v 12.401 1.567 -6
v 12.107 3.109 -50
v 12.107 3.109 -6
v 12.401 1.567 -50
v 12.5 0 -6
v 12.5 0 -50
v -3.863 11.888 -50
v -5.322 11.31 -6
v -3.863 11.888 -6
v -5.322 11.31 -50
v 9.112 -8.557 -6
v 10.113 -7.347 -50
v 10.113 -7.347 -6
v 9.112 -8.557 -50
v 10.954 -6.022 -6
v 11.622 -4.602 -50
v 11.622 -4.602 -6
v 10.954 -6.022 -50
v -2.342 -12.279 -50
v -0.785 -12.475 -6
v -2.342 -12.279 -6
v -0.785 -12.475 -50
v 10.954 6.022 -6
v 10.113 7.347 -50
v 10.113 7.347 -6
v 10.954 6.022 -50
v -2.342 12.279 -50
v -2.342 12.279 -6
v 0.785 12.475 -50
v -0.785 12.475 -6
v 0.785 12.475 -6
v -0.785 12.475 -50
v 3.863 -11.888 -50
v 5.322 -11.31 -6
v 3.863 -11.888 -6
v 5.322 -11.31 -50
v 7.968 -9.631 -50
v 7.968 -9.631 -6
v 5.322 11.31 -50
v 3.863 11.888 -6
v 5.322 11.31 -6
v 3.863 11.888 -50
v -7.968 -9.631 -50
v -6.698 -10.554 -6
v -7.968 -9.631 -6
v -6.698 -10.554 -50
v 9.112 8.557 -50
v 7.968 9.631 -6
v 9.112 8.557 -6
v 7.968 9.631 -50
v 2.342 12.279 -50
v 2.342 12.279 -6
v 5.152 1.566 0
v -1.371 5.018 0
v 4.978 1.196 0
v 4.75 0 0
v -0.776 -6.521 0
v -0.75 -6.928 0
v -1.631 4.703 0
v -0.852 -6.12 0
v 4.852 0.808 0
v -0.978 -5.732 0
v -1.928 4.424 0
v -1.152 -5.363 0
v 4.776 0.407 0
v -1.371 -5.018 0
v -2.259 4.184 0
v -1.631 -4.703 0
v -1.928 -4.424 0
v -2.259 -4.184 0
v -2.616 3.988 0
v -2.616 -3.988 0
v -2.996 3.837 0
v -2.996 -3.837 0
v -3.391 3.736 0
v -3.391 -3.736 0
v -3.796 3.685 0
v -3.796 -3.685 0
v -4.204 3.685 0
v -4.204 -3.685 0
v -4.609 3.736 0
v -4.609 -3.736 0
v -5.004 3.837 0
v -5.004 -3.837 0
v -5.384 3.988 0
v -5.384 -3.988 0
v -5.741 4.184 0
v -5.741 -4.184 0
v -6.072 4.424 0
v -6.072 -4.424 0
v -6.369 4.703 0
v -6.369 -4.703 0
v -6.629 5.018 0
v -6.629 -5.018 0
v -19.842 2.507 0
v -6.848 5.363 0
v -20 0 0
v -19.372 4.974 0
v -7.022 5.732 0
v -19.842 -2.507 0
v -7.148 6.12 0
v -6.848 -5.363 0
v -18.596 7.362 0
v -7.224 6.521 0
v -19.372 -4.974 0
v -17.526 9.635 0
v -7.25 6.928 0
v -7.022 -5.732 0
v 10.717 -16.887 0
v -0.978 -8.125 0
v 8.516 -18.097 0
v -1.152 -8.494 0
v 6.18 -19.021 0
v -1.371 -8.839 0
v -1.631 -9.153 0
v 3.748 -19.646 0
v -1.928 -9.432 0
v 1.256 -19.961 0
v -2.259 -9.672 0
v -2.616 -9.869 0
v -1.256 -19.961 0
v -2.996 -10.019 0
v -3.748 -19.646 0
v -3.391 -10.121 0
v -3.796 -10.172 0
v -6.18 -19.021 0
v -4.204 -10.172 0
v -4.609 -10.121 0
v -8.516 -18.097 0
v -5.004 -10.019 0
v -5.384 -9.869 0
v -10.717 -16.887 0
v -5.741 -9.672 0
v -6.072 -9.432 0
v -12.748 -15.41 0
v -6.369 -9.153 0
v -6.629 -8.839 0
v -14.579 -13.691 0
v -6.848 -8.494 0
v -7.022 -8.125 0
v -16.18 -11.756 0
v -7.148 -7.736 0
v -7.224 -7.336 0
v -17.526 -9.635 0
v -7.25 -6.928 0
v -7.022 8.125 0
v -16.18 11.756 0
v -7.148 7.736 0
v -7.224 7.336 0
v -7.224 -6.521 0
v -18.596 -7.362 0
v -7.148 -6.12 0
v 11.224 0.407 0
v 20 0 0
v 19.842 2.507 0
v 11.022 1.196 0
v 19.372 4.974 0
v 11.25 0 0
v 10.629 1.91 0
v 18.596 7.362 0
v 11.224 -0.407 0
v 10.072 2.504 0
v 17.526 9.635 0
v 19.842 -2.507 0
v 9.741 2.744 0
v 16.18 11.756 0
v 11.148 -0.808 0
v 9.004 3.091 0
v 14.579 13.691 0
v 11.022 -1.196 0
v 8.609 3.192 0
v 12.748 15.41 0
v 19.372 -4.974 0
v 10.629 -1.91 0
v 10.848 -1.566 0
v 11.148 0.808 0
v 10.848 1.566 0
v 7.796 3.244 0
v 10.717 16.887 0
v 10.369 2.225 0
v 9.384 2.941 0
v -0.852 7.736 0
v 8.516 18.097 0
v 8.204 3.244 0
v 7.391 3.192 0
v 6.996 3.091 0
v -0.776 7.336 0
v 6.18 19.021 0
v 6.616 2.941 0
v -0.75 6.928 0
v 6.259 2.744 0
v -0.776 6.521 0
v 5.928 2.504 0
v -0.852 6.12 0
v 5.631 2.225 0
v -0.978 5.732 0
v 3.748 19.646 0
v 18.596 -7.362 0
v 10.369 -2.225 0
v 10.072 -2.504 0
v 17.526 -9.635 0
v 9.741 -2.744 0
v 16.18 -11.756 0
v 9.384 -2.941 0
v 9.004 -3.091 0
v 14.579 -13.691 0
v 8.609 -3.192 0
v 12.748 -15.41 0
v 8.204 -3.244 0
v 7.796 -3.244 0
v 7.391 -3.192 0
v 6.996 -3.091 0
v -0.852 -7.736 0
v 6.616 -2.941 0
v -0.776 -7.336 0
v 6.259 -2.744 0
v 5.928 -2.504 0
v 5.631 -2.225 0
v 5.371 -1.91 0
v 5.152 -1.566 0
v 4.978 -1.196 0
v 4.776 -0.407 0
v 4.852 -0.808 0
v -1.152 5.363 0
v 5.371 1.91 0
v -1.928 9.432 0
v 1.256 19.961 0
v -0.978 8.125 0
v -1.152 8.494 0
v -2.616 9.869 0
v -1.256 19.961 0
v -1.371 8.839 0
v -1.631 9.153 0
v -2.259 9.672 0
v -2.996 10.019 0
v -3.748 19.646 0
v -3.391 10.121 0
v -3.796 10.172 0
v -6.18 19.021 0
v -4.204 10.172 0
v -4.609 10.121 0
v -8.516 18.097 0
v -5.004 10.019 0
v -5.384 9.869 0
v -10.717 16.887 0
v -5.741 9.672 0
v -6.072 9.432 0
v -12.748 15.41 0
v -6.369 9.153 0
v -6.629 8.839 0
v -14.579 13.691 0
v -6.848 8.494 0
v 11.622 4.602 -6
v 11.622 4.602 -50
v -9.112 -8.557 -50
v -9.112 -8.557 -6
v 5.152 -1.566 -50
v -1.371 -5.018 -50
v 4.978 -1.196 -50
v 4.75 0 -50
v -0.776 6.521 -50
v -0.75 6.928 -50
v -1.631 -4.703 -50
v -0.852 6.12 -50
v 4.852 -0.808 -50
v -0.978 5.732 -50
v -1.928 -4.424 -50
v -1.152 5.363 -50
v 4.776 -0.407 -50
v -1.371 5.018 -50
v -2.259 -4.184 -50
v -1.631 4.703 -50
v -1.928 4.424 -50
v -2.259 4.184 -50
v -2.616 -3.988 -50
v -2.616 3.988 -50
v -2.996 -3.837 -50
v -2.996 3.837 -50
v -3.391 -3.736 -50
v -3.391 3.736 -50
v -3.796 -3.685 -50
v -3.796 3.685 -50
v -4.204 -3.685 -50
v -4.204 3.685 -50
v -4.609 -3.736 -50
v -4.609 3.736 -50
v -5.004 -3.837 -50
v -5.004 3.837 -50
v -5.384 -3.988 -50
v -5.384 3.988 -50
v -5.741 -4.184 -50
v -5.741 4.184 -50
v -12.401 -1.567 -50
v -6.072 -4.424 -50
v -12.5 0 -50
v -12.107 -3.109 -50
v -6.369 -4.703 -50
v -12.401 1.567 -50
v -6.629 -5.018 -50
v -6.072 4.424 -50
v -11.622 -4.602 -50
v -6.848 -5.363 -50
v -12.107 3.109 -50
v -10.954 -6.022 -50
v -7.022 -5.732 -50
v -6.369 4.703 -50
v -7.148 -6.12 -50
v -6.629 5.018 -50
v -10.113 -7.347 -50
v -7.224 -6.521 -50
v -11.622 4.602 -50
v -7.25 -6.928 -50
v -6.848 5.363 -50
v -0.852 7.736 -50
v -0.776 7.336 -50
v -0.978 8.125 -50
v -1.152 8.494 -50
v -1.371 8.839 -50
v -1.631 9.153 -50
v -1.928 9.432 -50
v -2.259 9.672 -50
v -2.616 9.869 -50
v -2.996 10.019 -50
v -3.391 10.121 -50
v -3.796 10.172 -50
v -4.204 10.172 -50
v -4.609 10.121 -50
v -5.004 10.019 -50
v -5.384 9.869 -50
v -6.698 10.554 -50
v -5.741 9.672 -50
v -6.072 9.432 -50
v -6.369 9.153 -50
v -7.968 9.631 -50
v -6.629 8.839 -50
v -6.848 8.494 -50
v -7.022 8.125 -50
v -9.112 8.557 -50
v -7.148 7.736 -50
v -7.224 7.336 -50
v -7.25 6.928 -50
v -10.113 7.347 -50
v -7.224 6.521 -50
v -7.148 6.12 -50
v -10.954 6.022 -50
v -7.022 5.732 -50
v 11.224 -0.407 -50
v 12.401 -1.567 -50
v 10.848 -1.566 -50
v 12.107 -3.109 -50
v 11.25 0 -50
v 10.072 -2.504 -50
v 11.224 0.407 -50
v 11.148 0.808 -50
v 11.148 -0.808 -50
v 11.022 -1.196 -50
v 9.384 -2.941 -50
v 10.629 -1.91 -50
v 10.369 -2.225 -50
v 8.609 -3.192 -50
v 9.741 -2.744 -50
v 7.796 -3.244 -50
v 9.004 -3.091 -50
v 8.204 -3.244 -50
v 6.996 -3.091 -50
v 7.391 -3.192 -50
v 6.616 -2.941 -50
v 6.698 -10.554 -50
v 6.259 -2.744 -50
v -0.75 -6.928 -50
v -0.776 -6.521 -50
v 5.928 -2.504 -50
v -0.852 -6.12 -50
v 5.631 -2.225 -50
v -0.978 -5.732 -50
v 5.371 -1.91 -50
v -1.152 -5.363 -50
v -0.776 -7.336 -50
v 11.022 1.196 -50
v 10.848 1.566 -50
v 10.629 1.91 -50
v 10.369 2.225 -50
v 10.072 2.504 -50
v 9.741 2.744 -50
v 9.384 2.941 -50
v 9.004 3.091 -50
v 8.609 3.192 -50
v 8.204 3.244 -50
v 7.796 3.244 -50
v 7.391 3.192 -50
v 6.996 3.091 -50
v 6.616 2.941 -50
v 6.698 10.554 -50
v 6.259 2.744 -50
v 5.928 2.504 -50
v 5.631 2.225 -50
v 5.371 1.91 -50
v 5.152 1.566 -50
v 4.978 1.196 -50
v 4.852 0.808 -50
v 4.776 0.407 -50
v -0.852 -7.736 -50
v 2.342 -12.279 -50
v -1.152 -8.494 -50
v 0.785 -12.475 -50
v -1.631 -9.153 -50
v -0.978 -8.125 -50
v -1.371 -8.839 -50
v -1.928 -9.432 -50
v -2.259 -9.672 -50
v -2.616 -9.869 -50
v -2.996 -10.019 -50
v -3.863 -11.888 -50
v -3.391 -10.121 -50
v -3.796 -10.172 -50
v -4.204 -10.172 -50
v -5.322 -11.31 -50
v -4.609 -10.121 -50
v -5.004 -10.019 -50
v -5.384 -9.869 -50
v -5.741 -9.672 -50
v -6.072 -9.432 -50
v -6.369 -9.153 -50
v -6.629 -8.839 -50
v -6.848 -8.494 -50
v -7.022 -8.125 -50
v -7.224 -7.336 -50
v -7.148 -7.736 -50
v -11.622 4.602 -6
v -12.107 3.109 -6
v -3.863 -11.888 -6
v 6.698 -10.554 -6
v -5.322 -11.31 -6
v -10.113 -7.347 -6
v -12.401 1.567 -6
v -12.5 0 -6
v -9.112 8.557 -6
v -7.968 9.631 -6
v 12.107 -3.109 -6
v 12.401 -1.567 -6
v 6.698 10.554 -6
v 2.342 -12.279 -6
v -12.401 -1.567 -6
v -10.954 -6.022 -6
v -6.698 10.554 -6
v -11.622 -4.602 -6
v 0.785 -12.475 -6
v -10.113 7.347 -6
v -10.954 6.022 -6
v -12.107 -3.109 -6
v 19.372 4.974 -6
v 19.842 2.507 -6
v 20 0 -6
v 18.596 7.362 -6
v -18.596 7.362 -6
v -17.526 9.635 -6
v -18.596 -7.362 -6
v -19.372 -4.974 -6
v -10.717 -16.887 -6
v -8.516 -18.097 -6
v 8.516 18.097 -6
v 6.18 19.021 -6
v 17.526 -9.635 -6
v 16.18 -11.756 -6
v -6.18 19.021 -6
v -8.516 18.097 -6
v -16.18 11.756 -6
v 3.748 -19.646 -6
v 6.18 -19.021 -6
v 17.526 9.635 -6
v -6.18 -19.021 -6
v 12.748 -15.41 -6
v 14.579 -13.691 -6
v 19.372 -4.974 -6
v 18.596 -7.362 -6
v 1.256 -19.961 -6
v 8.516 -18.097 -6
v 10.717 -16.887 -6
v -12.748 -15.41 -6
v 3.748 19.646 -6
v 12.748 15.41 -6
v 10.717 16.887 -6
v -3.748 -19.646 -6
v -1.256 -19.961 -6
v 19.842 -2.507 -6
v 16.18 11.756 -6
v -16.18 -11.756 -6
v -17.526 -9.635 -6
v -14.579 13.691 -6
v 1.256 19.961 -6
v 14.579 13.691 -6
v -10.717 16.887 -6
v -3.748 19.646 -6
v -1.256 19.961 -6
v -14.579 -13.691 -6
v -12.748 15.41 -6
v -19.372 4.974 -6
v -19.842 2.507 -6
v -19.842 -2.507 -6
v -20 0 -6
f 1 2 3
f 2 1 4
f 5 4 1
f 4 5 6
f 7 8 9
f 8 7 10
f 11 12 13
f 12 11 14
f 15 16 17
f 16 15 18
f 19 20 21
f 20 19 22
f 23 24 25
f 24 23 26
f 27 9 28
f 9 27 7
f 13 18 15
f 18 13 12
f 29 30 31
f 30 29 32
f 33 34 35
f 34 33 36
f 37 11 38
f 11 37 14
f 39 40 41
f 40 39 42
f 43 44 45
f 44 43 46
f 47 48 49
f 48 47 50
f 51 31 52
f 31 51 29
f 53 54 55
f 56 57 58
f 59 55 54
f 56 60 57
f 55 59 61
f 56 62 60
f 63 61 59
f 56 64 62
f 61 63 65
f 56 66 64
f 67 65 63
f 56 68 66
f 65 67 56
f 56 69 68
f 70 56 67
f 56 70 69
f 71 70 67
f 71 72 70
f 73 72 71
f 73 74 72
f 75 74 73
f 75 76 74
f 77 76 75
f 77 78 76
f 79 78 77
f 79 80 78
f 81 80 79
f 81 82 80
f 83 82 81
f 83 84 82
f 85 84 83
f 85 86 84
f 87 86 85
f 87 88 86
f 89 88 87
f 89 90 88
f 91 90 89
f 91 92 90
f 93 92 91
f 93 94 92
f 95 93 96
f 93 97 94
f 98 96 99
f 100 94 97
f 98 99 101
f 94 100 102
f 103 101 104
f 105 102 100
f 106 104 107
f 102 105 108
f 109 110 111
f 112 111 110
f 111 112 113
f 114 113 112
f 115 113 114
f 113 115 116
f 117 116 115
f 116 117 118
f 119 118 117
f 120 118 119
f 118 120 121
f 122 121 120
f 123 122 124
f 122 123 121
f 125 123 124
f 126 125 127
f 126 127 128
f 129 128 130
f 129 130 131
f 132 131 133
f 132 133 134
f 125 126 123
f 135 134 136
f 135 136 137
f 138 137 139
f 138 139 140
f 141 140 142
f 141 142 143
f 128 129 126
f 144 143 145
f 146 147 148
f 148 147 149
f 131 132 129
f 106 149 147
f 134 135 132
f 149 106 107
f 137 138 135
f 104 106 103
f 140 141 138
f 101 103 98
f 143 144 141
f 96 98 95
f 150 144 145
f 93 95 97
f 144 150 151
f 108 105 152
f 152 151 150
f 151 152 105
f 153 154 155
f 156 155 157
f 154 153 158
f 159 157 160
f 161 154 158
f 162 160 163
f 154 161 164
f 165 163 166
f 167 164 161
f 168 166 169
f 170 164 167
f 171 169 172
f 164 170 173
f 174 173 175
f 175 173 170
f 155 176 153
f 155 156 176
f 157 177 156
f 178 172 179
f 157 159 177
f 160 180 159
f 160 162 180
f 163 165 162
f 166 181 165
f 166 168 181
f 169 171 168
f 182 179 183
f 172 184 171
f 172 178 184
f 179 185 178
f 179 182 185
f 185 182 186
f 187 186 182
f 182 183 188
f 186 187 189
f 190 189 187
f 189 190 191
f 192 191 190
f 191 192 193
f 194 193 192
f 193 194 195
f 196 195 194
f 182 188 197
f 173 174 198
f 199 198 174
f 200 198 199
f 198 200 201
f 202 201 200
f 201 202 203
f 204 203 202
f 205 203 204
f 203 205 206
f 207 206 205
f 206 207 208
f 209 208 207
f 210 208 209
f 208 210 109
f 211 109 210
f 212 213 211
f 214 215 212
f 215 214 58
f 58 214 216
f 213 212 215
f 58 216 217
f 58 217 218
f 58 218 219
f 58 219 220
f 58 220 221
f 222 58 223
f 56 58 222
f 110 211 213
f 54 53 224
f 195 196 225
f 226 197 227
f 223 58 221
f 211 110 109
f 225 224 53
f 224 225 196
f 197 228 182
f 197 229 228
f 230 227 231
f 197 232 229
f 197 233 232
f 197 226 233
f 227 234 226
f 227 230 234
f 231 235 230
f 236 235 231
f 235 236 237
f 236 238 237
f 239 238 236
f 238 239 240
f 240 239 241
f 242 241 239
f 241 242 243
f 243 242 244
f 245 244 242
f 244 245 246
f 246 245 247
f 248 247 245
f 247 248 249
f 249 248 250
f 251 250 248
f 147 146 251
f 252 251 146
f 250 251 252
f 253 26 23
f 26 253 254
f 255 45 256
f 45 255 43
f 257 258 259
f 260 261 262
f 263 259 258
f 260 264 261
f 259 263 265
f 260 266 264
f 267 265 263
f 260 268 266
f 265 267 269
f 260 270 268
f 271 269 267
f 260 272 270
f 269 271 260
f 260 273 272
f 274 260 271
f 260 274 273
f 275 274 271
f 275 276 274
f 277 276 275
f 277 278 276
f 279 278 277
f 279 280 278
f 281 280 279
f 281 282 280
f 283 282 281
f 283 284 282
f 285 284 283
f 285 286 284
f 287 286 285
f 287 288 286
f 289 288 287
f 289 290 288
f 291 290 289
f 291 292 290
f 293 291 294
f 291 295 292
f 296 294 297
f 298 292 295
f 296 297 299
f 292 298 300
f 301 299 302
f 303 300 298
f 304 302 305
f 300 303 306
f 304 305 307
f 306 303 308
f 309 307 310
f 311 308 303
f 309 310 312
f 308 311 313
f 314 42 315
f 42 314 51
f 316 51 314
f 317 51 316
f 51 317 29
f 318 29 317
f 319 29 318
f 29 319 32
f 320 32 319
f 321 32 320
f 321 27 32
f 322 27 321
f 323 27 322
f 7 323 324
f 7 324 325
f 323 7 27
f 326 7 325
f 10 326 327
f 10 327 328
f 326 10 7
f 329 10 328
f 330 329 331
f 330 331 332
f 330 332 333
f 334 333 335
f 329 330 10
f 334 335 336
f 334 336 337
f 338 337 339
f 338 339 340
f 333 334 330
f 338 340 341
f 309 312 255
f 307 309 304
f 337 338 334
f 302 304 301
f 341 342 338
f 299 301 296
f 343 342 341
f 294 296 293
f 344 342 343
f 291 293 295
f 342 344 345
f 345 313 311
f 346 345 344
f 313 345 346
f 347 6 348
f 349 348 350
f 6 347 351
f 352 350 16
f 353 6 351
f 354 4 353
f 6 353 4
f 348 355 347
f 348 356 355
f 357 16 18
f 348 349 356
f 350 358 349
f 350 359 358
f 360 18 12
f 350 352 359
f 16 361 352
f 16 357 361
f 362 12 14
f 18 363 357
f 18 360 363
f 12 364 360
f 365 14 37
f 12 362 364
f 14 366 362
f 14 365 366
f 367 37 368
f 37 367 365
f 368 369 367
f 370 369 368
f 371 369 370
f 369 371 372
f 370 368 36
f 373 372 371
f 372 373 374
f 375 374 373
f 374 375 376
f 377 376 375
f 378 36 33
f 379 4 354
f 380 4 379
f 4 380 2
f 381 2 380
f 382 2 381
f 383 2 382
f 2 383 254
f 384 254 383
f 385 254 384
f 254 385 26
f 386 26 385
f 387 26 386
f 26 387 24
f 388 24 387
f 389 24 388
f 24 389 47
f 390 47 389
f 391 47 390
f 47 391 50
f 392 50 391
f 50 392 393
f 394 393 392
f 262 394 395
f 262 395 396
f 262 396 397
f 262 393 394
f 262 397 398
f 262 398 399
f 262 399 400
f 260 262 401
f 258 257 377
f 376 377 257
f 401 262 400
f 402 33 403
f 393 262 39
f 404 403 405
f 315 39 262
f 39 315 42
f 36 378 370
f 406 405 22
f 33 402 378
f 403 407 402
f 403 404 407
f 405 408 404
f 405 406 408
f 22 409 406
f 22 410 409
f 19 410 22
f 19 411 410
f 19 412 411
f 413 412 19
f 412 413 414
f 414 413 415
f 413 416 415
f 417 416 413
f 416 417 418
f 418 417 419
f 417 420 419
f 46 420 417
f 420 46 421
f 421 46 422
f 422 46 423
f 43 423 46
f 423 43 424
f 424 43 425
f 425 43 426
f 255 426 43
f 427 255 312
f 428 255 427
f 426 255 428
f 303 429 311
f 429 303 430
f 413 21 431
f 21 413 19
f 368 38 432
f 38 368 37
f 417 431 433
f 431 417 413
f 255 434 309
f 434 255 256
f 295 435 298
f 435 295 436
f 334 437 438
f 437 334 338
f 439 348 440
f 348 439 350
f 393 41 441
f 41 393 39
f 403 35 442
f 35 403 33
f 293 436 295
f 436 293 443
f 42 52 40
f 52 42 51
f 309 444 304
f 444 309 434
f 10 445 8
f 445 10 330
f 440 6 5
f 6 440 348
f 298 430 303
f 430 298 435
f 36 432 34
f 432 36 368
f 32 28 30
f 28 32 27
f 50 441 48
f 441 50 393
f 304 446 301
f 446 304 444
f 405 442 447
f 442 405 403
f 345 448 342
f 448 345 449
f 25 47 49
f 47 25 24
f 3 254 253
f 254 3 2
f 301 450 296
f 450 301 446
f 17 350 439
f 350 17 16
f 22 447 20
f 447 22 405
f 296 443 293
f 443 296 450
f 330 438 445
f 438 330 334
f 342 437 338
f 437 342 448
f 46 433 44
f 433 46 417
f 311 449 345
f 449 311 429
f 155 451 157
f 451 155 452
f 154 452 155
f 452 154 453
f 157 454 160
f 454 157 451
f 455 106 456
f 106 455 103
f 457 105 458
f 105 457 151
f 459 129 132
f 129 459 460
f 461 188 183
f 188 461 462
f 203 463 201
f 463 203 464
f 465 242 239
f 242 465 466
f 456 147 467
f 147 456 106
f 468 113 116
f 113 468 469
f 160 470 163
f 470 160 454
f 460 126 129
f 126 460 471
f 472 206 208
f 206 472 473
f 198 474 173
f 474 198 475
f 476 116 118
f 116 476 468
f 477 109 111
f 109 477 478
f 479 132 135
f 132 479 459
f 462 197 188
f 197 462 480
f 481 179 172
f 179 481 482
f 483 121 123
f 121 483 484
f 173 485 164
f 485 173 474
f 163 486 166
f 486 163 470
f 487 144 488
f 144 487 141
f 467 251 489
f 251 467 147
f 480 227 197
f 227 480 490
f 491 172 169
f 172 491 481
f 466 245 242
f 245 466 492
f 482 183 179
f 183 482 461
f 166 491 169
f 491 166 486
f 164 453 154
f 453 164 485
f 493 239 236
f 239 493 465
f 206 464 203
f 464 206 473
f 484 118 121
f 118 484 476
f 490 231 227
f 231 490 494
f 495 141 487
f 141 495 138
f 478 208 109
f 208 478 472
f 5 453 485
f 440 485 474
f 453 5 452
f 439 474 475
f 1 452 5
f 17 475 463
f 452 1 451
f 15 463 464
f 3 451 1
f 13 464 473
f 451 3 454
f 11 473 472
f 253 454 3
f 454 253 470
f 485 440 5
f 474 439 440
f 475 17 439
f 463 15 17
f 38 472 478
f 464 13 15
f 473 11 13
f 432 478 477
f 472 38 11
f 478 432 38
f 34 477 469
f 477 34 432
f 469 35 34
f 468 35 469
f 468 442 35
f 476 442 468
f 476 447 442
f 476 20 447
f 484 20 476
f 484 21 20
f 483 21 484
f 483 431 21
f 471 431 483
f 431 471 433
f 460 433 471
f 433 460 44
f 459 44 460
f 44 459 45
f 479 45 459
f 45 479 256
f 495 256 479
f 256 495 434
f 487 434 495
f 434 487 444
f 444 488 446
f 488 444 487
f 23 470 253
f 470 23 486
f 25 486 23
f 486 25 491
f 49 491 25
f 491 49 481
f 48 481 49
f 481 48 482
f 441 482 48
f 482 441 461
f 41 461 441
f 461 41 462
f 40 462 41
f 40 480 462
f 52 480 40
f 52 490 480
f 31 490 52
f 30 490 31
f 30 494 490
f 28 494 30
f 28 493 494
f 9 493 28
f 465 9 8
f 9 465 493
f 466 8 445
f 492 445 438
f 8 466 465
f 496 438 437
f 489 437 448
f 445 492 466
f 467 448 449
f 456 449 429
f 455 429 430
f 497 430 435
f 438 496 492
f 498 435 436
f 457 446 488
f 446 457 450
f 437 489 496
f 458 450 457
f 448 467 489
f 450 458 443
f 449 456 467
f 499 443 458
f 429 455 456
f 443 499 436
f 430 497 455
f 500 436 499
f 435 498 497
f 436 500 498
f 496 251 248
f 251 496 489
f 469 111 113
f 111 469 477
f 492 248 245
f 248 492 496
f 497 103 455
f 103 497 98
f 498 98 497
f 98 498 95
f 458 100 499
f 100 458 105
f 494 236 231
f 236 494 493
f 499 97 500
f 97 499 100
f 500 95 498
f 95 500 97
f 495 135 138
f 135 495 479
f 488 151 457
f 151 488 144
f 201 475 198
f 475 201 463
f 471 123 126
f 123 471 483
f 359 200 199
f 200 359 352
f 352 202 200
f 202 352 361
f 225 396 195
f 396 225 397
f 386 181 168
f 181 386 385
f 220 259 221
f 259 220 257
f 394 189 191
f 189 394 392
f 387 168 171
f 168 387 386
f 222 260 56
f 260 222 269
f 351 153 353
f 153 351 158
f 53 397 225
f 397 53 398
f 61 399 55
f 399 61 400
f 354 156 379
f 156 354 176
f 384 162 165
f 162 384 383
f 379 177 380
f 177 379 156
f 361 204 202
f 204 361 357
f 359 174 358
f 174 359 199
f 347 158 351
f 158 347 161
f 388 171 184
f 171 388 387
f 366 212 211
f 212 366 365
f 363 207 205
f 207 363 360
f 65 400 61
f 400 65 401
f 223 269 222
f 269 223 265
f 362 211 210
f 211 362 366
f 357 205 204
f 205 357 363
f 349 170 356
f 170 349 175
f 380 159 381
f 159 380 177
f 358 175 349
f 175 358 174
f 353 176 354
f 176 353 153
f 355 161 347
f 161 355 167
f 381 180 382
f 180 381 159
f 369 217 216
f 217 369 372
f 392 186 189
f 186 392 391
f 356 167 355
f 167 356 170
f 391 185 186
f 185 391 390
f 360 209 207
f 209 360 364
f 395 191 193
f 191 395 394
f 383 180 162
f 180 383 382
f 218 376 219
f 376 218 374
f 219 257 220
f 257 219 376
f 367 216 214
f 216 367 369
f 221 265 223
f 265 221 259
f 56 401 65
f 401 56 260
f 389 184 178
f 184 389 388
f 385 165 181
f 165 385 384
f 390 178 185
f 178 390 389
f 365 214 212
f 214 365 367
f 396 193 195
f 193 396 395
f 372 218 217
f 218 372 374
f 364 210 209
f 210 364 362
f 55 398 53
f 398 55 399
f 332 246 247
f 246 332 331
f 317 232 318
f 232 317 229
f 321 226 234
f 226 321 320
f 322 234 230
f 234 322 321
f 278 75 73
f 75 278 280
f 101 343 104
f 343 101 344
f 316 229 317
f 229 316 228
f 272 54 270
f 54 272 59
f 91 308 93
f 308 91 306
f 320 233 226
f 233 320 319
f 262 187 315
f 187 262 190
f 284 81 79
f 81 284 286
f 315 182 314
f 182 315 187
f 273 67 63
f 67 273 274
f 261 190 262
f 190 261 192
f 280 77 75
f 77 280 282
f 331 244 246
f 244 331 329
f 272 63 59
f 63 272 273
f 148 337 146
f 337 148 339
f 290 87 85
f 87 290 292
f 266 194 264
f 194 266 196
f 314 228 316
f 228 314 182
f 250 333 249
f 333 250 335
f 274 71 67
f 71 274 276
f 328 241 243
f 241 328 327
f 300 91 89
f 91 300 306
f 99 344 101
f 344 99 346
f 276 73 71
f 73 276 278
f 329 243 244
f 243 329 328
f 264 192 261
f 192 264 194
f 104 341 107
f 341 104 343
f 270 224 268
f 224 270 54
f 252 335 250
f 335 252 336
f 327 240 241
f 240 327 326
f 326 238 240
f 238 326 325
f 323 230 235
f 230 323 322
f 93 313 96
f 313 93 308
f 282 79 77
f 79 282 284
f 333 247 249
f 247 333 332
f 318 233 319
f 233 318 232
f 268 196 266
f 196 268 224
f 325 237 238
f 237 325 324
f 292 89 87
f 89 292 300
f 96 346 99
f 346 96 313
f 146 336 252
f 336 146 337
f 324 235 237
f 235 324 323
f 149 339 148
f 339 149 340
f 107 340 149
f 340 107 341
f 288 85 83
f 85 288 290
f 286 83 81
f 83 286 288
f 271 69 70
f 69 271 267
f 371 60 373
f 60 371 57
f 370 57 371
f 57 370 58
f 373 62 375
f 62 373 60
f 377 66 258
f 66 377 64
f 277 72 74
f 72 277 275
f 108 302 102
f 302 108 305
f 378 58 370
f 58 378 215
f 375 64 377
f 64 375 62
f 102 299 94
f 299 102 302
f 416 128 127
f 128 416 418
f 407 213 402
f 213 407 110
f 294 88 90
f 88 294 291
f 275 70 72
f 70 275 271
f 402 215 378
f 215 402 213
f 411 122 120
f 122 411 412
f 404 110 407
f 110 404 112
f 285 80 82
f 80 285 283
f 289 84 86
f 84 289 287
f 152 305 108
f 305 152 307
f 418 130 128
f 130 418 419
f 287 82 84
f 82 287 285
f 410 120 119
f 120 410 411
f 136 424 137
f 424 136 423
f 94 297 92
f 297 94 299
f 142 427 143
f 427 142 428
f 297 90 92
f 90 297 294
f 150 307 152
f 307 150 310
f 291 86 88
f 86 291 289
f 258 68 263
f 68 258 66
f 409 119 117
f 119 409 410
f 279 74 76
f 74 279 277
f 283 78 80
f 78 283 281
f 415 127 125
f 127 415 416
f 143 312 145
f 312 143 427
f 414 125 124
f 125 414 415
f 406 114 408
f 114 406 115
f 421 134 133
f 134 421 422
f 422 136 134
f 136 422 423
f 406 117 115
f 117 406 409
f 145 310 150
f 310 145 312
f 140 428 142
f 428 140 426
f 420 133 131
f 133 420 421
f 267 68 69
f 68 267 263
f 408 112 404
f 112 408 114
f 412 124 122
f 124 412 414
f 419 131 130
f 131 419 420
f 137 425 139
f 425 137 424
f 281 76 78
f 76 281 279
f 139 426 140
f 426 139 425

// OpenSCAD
$fn = 50;


difference() {
	union() {
		translate(v = [0, 0, -50.0000000000]) {
			cylinder(h = 50, r = 12.5000000000);
		}
		translate(v = [0, 0, -6.0000000000]) {
			cylinder(h = 6, r = 20.0000000000);
		}
	}
	union() {
		#translate(v = [8.0000000000, 0.0000000000, -50]) {
			cylinder(h = 50, r = 3.2500000000);
		}
		#translate(v = [-4.0000000000, 6.9282032303, -50]) {
			cylinder(h = 50, r = 3.2500000000);
		}
		#translate(v = [-4.0000000000, -6.9282032303, -50]) {
			cylinder(h = 50, r = 3.2500000000);
		}
	}
}
